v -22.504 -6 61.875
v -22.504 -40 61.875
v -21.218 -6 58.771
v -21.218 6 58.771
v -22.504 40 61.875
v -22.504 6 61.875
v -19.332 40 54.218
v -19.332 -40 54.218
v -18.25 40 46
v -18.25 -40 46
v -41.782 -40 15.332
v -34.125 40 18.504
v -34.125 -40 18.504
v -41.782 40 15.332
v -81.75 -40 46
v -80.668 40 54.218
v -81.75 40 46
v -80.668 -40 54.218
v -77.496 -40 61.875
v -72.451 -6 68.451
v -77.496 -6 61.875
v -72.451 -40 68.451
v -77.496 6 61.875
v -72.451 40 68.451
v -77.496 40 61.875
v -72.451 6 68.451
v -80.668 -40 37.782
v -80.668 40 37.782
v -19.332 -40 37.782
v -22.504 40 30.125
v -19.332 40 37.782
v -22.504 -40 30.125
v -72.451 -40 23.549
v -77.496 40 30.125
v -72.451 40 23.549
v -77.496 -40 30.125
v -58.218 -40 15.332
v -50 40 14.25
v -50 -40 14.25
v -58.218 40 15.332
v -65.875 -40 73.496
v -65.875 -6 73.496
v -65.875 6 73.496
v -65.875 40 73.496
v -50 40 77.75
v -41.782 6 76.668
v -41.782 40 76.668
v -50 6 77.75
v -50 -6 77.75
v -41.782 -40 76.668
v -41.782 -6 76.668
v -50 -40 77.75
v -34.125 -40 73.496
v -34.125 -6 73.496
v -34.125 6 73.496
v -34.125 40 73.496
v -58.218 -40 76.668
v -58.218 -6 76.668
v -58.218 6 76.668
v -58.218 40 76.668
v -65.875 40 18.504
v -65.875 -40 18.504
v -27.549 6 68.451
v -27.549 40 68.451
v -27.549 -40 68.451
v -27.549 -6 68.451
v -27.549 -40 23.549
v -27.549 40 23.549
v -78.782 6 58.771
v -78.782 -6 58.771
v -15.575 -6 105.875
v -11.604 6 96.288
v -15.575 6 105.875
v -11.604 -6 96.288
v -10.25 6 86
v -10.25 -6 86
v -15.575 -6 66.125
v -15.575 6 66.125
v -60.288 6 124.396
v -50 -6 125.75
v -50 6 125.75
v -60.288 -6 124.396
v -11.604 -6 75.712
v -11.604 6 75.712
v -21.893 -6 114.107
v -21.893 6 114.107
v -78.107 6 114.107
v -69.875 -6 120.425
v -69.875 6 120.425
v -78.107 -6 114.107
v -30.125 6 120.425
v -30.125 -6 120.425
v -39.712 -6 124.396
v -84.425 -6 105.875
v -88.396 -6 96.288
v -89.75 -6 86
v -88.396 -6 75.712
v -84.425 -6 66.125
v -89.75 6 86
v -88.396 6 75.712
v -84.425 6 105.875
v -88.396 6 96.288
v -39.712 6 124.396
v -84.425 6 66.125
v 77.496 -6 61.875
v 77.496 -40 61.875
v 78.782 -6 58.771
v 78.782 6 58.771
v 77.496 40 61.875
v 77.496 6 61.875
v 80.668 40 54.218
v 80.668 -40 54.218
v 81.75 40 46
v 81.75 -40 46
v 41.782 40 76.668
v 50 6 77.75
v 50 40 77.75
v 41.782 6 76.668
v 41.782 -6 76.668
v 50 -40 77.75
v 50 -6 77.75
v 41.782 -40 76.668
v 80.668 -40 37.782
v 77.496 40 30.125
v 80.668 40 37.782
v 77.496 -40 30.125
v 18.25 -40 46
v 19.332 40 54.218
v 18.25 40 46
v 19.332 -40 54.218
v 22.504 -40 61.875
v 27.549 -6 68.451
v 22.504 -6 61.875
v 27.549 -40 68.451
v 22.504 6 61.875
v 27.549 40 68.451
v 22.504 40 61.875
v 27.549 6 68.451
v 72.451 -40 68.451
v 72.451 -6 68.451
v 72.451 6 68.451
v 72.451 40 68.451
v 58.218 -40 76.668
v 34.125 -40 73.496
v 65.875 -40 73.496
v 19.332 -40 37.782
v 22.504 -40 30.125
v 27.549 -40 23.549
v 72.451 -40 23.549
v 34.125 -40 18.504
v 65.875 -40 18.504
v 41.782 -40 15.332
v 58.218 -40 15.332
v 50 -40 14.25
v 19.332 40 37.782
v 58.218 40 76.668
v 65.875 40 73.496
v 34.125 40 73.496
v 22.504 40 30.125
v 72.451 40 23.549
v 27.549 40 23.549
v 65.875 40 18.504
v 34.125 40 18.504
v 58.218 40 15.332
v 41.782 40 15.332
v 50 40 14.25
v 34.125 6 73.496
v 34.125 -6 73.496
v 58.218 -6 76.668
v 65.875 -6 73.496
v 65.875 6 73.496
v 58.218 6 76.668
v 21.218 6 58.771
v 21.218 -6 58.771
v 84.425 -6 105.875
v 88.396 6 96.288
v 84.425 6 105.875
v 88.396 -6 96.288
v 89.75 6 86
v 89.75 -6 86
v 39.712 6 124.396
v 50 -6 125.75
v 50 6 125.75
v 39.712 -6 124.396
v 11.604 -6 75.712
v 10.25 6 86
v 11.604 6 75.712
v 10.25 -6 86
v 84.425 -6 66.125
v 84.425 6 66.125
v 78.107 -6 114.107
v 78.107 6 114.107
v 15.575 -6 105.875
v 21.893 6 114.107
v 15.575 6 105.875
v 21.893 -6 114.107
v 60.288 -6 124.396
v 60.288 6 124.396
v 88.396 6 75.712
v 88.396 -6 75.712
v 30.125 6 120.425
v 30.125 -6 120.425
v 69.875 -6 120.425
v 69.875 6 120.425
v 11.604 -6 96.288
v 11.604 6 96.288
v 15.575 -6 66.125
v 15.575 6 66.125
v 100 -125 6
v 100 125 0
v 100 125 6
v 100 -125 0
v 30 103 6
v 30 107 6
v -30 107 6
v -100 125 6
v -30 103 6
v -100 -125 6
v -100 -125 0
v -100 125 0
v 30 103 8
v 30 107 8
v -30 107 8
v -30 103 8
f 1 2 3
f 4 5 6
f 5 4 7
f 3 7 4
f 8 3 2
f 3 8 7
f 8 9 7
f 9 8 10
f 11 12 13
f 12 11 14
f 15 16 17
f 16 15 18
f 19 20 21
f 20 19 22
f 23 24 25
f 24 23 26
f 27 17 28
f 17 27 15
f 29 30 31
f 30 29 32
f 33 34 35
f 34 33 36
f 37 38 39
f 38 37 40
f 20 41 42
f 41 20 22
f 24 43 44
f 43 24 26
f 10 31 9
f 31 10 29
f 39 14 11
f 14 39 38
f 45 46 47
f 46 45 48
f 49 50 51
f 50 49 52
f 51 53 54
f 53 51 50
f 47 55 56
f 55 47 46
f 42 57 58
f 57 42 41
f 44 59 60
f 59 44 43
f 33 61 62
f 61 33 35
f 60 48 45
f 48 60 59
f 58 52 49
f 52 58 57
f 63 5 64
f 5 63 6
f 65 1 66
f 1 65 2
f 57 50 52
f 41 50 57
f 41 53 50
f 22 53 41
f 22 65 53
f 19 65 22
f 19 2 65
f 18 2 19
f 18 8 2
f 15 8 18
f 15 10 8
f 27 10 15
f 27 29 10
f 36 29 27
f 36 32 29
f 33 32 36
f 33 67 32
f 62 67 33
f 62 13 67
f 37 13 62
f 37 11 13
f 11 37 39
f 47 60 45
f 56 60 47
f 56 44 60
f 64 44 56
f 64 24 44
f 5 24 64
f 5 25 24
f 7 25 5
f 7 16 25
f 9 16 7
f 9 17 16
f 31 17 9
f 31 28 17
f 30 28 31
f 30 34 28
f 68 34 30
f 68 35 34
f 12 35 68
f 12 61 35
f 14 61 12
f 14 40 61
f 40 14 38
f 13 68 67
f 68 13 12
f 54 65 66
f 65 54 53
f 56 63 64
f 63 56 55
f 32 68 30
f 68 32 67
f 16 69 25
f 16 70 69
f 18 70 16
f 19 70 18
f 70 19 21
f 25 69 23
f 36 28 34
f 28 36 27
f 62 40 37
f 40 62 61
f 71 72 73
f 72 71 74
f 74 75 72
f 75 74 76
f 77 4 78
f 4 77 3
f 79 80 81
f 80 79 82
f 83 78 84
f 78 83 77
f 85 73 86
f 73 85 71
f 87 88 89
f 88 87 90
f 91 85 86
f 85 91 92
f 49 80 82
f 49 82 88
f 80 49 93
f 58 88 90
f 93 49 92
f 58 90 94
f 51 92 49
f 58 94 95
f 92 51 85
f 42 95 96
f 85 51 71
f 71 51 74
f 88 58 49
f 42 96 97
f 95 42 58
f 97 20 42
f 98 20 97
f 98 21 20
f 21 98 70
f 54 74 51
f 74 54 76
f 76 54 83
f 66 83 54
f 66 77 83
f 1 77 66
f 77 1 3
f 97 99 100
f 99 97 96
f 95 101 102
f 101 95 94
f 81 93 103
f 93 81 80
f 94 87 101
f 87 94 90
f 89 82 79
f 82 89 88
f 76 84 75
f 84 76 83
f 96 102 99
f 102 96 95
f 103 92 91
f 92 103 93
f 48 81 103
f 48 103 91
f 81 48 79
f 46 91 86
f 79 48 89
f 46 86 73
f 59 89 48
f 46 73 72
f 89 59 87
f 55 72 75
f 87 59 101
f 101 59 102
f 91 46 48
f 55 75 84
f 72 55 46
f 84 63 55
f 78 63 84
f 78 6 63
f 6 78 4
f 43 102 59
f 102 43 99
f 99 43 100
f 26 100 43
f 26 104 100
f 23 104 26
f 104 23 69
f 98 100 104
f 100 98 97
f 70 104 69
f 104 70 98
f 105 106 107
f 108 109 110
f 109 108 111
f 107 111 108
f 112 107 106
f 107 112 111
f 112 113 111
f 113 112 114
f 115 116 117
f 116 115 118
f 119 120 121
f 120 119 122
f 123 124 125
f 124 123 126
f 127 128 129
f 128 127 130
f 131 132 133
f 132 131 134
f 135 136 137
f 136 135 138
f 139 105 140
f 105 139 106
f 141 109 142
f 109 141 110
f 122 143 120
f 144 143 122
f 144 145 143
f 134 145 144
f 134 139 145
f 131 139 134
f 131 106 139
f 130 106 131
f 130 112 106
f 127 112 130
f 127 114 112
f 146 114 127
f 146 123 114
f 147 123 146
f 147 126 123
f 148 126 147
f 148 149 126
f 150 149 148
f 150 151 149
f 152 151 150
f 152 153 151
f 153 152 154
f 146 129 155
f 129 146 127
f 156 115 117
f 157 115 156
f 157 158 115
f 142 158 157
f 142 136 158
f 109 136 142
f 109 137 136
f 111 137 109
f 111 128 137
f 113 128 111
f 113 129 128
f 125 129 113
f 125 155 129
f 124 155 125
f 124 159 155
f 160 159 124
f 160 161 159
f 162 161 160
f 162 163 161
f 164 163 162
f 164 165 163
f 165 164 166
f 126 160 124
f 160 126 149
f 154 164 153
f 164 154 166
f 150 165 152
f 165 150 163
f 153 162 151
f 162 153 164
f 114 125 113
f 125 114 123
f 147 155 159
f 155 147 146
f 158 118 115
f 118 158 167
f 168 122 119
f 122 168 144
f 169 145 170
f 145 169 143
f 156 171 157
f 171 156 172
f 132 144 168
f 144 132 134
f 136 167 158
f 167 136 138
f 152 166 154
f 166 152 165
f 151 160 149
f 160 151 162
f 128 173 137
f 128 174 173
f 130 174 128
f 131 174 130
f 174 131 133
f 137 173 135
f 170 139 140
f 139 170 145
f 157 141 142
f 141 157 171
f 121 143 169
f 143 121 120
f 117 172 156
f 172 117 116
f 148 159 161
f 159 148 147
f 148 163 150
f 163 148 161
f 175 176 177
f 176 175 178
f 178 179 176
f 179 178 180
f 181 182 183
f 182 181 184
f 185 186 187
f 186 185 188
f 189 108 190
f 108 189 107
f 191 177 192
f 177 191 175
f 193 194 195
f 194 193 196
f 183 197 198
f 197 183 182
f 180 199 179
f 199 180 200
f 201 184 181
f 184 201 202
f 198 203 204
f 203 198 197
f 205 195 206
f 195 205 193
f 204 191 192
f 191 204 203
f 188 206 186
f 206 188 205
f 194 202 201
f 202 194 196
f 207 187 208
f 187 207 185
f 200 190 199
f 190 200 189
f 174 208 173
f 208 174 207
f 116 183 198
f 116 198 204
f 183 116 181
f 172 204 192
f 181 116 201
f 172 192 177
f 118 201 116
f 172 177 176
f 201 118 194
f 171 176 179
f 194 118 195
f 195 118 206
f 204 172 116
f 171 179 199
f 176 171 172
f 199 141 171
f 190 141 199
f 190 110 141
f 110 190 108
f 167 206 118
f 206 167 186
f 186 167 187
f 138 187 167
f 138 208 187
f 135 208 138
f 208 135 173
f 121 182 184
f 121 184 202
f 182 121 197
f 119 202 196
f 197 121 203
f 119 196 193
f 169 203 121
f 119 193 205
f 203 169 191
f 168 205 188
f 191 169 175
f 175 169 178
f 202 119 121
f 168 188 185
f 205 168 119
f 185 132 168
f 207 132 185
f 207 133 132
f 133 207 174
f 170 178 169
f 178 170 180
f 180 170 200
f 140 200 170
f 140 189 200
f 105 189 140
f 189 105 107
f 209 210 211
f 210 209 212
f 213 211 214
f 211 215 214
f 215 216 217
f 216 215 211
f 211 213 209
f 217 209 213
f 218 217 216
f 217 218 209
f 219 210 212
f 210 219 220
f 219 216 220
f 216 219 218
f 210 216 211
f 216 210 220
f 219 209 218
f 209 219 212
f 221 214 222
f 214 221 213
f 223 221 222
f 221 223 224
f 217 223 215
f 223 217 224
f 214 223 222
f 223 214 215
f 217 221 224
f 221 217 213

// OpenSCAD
// Fire Department Connection (FDC) — exterior wall hookup.
// Two 2-1/2" Stortz couplings + escutcheon plate. Local origin =
// plate center, projects toward street.
// V2 Phase 4.1.

inlet_size_in = 2.5;     // 2-1/2" Stortz standard
plate_w_mm = 200;
plate_h_mm = 250;
plate_thick_mm = 6;
inlet_proj_mm = 80;      // how far inlets stick out

mm_per_in = 25.4;
inlet_dia_mm = inlet_size_in * mm_per_in;

// Escutcheon plate
translate([0, 0, plate_thick_mm / 2])
    cube(size = [plate_w_mm, plate_h_mm, plate_thick_mm], center = true);

// Two inlets (left + right)
for (sx = [-1, 1]) {
    translate([sx * 50, 0, plate_thick_mm + inlet_proj_mm / 2])
        rotate([90, 0, 0])
            cylinder(h = inlet_proj_mm, r = inlet_dia_mm / 2,
                     center = true, $fn = 24);
    // Stortz lug ring
    translate([sx * 50, 0, plate_thick_mm + inlet_proj_mm])
        rotate([90, 0, 0])
            cylinder(h = 12, r = inlet_dia_mm / 2 + 8,
                     center = true, $fn = 24);
}

// "FDC" label embossed (placeholder — visual cue)
translate([0, plate_h_mm / 2 - 20, plate_thick_mm + 1])
    cube(size = [60, 4, 2], center = true);  // simplified text bar
